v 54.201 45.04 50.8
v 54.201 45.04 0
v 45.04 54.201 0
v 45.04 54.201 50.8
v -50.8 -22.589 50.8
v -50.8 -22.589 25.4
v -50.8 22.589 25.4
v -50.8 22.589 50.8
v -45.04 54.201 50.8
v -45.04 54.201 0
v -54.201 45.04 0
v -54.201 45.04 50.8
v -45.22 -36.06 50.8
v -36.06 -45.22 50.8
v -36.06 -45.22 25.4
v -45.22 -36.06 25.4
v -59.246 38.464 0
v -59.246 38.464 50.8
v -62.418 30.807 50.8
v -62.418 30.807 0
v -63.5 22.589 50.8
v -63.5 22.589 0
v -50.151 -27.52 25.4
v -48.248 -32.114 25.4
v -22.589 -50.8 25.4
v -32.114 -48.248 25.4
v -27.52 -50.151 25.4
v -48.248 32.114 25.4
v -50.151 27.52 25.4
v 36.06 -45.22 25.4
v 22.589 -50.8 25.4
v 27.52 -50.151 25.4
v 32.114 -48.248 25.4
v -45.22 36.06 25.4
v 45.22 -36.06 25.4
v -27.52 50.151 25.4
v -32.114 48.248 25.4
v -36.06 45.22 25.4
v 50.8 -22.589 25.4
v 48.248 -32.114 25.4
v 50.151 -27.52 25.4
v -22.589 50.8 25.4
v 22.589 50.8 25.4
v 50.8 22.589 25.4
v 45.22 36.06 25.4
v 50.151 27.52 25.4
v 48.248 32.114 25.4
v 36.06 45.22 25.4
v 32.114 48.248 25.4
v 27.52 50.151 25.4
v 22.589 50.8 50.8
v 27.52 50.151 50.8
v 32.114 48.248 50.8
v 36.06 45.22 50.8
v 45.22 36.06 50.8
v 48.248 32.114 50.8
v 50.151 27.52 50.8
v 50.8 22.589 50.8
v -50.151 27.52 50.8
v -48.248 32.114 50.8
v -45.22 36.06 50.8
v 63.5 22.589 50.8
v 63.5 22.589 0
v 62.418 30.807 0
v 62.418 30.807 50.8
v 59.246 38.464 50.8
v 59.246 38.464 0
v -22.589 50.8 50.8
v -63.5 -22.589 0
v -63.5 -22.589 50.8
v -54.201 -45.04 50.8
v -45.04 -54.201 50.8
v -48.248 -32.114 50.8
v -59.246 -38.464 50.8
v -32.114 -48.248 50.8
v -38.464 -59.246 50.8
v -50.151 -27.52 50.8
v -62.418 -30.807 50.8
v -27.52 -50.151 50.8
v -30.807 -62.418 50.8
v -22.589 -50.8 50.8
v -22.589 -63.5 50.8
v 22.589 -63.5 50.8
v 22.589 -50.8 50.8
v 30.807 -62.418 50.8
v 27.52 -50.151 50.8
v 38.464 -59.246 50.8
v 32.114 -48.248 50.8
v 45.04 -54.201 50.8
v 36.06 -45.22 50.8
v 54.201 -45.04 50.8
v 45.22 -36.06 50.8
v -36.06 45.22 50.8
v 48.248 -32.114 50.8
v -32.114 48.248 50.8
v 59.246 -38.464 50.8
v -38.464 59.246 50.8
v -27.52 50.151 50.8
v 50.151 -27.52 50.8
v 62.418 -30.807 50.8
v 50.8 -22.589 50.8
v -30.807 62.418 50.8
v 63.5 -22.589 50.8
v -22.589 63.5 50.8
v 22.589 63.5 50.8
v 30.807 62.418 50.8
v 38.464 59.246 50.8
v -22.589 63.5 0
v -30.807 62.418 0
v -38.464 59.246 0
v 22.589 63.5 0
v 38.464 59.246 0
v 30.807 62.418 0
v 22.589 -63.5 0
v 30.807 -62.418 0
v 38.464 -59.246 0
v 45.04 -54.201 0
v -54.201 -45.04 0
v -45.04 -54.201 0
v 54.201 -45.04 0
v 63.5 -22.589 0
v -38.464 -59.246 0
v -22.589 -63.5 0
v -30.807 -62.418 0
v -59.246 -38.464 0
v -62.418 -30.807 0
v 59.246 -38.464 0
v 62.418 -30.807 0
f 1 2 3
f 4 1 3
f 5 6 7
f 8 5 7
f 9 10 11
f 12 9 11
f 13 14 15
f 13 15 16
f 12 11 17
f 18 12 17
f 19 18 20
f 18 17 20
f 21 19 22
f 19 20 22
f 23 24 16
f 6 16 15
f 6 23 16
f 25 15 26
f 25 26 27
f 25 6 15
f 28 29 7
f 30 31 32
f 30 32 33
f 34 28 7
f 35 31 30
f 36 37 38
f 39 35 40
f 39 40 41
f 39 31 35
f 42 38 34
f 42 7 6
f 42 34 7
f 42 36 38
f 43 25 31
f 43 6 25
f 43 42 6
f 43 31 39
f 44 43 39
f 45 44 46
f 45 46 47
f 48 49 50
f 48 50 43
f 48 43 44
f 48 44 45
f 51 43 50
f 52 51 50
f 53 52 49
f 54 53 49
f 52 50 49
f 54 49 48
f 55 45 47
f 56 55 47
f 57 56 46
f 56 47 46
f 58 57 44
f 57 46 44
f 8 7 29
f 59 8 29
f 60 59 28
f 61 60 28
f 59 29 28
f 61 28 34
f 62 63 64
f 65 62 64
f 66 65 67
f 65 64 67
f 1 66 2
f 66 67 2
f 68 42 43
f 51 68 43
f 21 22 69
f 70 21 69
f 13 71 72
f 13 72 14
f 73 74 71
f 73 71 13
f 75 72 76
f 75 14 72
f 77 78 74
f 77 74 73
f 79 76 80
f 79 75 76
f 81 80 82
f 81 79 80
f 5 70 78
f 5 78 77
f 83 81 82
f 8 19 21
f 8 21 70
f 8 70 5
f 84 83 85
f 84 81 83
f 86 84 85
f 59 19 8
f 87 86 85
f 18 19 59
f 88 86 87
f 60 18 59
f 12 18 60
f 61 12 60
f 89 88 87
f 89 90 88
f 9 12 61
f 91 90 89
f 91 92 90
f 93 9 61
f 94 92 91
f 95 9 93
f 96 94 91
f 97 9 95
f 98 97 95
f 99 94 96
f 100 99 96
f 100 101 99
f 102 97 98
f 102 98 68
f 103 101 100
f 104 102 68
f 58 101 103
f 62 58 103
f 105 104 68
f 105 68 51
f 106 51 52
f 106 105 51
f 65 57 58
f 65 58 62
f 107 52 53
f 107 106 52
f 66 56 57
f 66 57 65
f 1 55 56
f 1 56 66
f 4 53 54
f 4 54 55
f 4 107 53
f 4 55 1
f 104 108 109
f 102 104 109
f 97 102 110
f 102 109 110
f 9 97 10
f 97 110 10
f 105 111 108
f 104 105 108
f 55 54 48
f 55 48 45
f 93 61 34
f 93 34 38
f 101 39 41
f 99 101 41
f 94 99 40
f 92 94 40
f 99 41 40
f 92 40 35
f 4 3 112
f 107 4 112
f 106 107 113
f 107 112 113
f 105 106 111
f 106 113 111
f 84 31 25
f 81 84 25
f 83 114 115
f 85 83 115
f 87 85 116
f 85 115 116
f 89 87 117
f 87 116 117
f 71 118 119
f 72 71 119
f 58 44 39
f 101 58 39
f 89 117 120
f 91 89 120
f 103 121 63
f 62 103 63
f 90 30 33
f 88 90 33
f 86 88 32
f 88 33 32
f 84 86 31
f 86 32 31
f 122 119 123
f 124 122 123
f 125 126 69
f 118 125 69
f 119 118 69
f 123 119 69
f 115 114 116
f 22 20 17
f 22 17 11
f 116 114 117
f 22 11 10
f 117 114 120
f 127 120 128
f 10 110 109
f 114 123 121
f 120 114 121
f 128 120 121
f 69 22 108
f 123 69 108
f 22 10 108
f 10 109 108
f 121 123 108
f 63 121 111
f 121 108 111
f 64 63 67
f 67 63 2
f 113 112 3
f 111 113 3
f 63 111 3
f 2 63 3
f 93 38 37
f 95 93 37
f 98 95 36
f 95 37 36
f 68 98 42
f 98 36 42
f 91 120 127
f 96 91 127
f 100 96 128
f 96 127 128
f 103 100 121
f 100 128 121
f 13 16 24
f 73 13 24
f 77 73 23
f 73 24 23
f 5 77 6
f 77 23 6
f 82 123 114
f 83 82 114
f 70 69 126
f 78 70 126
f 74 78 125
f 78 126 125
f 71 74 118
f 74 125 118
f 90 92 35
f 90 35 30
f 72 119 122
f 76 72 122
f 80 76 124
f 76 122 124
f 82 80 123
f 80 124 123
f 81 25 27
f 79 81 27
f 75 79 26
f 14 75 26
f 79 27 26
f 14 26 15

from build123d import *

# Parameters (mm, degrees)
F1_DEPTH = 25.4
F2_DEPTH = 50.8


with BuildPart() as f1:
    # F0 (on Top) → F1 (new body)
    with BuildSketch(Plane.XY):
        with BuildLine():
            Line((-22.589232, -50.8), (0, -50.8))
            Line((0, -50.8), (22.589232, -50.8))
            ThreePointArc((22.589232, -50.8), (29.879351, -49.349905), (36.059616, -45.220384))
            Line((36.059616, -45.220384), (45.220384, -36.059616))
            ThreePointArc((45.220384, -36.059616), (49.349905, -29.879351), (50.8, -22.589232))
            Line((50.8, -22.589232), (50.8, 0))
            Line((50.8, 0), (50.8, 22.589232))
            ThreePointArc((50.8, 22.589232), (49.349905, 29.879351), (45.220384, 36.059616))
            Line((45.220384, 36.059616), (36.059616, 45.220384))
            ThreePointArc((36.059616, 45.220384), (29.879351, 49.349905), (22.589232, 50.8))
            Line((22.589232, 50.8), (0, 50.8))
            Line((0, 50.8), (-22.589232, 50.8))
            ThreePointArc((-22.589232, 50.8), (-29.879351, 49.349905), (-36.059616, 45.220384))
            Line((-36.059616, 45.220384), (-45.220384, 36.059616))
            ThreePointArc((-45.220384, 36.059616), (-49.349905, 29.879351), (-50.8, 22.589232))
            Line((-50.8, 22.589232), (-50.8, 0))
            Line((-50.8, 0), (-50.8, -22.589232))
            ThreePointArc((-50.8, -22.589232), (-49.349905, -29.879351), (-45.220384, -36.059616))
            Line((-45.220384, -36.059616), (-36.059616, -45.220384))
            ThreePointArc((-36.059616, -45.220384), (-29.879351, -49.349905), (-22.589232, -50.8))
        make_face()
    extrude(amount=F1_DEPTH)

    # F0 (on Top) → F2 (join)
    with BuildSketch(Plane.XY):
        with BuildLine():
            ThreePointArc((54.20064, -45.039872), (61.083175, -34.739431), (63.5, -22.589232))
            Line((63.5, -22.589232), (63.5, 0))
            Line((63.5, 0), (63.5, 22.589232))
            ThreePointArc((63.5, 22.589232), (61.083175, 34.739431), (54.20064, 45.039872))
            Line((54.20064, 45.039872), (45.039872, 54.20064))
            ThreePointArc((45.039872, 54.20064), (34.739431, 61.083175), (22.589232, 63.5))
            Line((22.589232, 63.5), (0, 63.5))
            Line((0, 63.5), (-22.589232, 63.5))
            ThreePointArc((-22.589232, 63.5), (-34.739431, 61.083175), (-45.039872, 54.20064))
            Line((-45.039872, 54.20064), (-54.20064, 45.039872))
            ThreePointArc((-54.20064, 45.039872), (-61.083175, 34.739431), (-63.5, 22.589232))
            Line((-63.5, 22.589232), (-63.5, 0))
            Line((-63.5, 0), (-63.5, -22.589232))
            ThreePointArc((-63.5, -22.589232), (-61.083175, -34.739431), (-54.20064, -45.039872))
            Line((-54.20064, -45.039872), (-45.039872, -54.20064))
            ThreePointArc((-45.039872, -54.20064), (-34.739431, -61.083175), (-22.589232, -63.5))
            Line((-22.589232, -63.5), (0, -63.5))
            Line((0, -63.5), (22.589232, -63.5))
            ThreePointArc((22.589232, -63.5), (34.739431, -61.083175), (45.039872, -54.20064))
            Line((45.039872, -54.20064), (54.20064, -45.039872))
        make_face()
        with BuildLine():
            Line((22.589232, -50.8), (0, -50.8))
            Line((0, -50.8), (-22.589232, -50.8))
            ThreePointArc((-22.589232, -50.8), (-29.879351, -49.349905), (-36.059616, -45.220384))
            Line((-36.059616, -45.220384), (-45.220384, -36.059616))
            ThreePointArc((-45.220384, -36.059616), (-49.349905, -29.879351), (-50.8, -22.589232))
            Line((-50.8, -22.589232), (-50.8, 0))
            Line((-50.8, 0), (-50.8, 22.589232))
            ThreePointArc((-50.8, 22.589232), (-49.349905, 29.879351), (-45.220384, 36.059616))
            Line((-45.220384, 36.059616), (-36.059616, 45.220384))
            ThreePointArc((-36.059616, 45.220384), (-29.879351, 49.349905), (-22.589232, 50.8))
            Line((-22.589232, 50.8), (0, 50.8))
            Line((0, 50.8), (22.589232, 50.8))
            ThreePointArc((22.589232, 50.8), (29.879351, 49.349905), (36.059616, 45.220384))
            Line((36.059616, 45.220384), (45.220384, 36.059616))
            ThreePointArc((45.220384, 36.059616), (49.349905, 29.879351), (50.8, 22.589232))
            Line((50.8, 22.589232), (50.8, 0))
            Line((50.8, 0), (50.8, -22.589232))
            ThreePointArc((50.8, -22.589232), (49.349905, -29.879351), (45.220384, -36.059616))
            Line((45.220384, -36.059616), (36.059616, -45.220384))
            ThreePointArc((36.059616, -45.220384), (29.879351, -49.349905), (22.589232, -50.8))
        make_face(mode=Mode.SUBTRACT)
    extrude(amount=F2_DEPTH)


solid = f1.part
